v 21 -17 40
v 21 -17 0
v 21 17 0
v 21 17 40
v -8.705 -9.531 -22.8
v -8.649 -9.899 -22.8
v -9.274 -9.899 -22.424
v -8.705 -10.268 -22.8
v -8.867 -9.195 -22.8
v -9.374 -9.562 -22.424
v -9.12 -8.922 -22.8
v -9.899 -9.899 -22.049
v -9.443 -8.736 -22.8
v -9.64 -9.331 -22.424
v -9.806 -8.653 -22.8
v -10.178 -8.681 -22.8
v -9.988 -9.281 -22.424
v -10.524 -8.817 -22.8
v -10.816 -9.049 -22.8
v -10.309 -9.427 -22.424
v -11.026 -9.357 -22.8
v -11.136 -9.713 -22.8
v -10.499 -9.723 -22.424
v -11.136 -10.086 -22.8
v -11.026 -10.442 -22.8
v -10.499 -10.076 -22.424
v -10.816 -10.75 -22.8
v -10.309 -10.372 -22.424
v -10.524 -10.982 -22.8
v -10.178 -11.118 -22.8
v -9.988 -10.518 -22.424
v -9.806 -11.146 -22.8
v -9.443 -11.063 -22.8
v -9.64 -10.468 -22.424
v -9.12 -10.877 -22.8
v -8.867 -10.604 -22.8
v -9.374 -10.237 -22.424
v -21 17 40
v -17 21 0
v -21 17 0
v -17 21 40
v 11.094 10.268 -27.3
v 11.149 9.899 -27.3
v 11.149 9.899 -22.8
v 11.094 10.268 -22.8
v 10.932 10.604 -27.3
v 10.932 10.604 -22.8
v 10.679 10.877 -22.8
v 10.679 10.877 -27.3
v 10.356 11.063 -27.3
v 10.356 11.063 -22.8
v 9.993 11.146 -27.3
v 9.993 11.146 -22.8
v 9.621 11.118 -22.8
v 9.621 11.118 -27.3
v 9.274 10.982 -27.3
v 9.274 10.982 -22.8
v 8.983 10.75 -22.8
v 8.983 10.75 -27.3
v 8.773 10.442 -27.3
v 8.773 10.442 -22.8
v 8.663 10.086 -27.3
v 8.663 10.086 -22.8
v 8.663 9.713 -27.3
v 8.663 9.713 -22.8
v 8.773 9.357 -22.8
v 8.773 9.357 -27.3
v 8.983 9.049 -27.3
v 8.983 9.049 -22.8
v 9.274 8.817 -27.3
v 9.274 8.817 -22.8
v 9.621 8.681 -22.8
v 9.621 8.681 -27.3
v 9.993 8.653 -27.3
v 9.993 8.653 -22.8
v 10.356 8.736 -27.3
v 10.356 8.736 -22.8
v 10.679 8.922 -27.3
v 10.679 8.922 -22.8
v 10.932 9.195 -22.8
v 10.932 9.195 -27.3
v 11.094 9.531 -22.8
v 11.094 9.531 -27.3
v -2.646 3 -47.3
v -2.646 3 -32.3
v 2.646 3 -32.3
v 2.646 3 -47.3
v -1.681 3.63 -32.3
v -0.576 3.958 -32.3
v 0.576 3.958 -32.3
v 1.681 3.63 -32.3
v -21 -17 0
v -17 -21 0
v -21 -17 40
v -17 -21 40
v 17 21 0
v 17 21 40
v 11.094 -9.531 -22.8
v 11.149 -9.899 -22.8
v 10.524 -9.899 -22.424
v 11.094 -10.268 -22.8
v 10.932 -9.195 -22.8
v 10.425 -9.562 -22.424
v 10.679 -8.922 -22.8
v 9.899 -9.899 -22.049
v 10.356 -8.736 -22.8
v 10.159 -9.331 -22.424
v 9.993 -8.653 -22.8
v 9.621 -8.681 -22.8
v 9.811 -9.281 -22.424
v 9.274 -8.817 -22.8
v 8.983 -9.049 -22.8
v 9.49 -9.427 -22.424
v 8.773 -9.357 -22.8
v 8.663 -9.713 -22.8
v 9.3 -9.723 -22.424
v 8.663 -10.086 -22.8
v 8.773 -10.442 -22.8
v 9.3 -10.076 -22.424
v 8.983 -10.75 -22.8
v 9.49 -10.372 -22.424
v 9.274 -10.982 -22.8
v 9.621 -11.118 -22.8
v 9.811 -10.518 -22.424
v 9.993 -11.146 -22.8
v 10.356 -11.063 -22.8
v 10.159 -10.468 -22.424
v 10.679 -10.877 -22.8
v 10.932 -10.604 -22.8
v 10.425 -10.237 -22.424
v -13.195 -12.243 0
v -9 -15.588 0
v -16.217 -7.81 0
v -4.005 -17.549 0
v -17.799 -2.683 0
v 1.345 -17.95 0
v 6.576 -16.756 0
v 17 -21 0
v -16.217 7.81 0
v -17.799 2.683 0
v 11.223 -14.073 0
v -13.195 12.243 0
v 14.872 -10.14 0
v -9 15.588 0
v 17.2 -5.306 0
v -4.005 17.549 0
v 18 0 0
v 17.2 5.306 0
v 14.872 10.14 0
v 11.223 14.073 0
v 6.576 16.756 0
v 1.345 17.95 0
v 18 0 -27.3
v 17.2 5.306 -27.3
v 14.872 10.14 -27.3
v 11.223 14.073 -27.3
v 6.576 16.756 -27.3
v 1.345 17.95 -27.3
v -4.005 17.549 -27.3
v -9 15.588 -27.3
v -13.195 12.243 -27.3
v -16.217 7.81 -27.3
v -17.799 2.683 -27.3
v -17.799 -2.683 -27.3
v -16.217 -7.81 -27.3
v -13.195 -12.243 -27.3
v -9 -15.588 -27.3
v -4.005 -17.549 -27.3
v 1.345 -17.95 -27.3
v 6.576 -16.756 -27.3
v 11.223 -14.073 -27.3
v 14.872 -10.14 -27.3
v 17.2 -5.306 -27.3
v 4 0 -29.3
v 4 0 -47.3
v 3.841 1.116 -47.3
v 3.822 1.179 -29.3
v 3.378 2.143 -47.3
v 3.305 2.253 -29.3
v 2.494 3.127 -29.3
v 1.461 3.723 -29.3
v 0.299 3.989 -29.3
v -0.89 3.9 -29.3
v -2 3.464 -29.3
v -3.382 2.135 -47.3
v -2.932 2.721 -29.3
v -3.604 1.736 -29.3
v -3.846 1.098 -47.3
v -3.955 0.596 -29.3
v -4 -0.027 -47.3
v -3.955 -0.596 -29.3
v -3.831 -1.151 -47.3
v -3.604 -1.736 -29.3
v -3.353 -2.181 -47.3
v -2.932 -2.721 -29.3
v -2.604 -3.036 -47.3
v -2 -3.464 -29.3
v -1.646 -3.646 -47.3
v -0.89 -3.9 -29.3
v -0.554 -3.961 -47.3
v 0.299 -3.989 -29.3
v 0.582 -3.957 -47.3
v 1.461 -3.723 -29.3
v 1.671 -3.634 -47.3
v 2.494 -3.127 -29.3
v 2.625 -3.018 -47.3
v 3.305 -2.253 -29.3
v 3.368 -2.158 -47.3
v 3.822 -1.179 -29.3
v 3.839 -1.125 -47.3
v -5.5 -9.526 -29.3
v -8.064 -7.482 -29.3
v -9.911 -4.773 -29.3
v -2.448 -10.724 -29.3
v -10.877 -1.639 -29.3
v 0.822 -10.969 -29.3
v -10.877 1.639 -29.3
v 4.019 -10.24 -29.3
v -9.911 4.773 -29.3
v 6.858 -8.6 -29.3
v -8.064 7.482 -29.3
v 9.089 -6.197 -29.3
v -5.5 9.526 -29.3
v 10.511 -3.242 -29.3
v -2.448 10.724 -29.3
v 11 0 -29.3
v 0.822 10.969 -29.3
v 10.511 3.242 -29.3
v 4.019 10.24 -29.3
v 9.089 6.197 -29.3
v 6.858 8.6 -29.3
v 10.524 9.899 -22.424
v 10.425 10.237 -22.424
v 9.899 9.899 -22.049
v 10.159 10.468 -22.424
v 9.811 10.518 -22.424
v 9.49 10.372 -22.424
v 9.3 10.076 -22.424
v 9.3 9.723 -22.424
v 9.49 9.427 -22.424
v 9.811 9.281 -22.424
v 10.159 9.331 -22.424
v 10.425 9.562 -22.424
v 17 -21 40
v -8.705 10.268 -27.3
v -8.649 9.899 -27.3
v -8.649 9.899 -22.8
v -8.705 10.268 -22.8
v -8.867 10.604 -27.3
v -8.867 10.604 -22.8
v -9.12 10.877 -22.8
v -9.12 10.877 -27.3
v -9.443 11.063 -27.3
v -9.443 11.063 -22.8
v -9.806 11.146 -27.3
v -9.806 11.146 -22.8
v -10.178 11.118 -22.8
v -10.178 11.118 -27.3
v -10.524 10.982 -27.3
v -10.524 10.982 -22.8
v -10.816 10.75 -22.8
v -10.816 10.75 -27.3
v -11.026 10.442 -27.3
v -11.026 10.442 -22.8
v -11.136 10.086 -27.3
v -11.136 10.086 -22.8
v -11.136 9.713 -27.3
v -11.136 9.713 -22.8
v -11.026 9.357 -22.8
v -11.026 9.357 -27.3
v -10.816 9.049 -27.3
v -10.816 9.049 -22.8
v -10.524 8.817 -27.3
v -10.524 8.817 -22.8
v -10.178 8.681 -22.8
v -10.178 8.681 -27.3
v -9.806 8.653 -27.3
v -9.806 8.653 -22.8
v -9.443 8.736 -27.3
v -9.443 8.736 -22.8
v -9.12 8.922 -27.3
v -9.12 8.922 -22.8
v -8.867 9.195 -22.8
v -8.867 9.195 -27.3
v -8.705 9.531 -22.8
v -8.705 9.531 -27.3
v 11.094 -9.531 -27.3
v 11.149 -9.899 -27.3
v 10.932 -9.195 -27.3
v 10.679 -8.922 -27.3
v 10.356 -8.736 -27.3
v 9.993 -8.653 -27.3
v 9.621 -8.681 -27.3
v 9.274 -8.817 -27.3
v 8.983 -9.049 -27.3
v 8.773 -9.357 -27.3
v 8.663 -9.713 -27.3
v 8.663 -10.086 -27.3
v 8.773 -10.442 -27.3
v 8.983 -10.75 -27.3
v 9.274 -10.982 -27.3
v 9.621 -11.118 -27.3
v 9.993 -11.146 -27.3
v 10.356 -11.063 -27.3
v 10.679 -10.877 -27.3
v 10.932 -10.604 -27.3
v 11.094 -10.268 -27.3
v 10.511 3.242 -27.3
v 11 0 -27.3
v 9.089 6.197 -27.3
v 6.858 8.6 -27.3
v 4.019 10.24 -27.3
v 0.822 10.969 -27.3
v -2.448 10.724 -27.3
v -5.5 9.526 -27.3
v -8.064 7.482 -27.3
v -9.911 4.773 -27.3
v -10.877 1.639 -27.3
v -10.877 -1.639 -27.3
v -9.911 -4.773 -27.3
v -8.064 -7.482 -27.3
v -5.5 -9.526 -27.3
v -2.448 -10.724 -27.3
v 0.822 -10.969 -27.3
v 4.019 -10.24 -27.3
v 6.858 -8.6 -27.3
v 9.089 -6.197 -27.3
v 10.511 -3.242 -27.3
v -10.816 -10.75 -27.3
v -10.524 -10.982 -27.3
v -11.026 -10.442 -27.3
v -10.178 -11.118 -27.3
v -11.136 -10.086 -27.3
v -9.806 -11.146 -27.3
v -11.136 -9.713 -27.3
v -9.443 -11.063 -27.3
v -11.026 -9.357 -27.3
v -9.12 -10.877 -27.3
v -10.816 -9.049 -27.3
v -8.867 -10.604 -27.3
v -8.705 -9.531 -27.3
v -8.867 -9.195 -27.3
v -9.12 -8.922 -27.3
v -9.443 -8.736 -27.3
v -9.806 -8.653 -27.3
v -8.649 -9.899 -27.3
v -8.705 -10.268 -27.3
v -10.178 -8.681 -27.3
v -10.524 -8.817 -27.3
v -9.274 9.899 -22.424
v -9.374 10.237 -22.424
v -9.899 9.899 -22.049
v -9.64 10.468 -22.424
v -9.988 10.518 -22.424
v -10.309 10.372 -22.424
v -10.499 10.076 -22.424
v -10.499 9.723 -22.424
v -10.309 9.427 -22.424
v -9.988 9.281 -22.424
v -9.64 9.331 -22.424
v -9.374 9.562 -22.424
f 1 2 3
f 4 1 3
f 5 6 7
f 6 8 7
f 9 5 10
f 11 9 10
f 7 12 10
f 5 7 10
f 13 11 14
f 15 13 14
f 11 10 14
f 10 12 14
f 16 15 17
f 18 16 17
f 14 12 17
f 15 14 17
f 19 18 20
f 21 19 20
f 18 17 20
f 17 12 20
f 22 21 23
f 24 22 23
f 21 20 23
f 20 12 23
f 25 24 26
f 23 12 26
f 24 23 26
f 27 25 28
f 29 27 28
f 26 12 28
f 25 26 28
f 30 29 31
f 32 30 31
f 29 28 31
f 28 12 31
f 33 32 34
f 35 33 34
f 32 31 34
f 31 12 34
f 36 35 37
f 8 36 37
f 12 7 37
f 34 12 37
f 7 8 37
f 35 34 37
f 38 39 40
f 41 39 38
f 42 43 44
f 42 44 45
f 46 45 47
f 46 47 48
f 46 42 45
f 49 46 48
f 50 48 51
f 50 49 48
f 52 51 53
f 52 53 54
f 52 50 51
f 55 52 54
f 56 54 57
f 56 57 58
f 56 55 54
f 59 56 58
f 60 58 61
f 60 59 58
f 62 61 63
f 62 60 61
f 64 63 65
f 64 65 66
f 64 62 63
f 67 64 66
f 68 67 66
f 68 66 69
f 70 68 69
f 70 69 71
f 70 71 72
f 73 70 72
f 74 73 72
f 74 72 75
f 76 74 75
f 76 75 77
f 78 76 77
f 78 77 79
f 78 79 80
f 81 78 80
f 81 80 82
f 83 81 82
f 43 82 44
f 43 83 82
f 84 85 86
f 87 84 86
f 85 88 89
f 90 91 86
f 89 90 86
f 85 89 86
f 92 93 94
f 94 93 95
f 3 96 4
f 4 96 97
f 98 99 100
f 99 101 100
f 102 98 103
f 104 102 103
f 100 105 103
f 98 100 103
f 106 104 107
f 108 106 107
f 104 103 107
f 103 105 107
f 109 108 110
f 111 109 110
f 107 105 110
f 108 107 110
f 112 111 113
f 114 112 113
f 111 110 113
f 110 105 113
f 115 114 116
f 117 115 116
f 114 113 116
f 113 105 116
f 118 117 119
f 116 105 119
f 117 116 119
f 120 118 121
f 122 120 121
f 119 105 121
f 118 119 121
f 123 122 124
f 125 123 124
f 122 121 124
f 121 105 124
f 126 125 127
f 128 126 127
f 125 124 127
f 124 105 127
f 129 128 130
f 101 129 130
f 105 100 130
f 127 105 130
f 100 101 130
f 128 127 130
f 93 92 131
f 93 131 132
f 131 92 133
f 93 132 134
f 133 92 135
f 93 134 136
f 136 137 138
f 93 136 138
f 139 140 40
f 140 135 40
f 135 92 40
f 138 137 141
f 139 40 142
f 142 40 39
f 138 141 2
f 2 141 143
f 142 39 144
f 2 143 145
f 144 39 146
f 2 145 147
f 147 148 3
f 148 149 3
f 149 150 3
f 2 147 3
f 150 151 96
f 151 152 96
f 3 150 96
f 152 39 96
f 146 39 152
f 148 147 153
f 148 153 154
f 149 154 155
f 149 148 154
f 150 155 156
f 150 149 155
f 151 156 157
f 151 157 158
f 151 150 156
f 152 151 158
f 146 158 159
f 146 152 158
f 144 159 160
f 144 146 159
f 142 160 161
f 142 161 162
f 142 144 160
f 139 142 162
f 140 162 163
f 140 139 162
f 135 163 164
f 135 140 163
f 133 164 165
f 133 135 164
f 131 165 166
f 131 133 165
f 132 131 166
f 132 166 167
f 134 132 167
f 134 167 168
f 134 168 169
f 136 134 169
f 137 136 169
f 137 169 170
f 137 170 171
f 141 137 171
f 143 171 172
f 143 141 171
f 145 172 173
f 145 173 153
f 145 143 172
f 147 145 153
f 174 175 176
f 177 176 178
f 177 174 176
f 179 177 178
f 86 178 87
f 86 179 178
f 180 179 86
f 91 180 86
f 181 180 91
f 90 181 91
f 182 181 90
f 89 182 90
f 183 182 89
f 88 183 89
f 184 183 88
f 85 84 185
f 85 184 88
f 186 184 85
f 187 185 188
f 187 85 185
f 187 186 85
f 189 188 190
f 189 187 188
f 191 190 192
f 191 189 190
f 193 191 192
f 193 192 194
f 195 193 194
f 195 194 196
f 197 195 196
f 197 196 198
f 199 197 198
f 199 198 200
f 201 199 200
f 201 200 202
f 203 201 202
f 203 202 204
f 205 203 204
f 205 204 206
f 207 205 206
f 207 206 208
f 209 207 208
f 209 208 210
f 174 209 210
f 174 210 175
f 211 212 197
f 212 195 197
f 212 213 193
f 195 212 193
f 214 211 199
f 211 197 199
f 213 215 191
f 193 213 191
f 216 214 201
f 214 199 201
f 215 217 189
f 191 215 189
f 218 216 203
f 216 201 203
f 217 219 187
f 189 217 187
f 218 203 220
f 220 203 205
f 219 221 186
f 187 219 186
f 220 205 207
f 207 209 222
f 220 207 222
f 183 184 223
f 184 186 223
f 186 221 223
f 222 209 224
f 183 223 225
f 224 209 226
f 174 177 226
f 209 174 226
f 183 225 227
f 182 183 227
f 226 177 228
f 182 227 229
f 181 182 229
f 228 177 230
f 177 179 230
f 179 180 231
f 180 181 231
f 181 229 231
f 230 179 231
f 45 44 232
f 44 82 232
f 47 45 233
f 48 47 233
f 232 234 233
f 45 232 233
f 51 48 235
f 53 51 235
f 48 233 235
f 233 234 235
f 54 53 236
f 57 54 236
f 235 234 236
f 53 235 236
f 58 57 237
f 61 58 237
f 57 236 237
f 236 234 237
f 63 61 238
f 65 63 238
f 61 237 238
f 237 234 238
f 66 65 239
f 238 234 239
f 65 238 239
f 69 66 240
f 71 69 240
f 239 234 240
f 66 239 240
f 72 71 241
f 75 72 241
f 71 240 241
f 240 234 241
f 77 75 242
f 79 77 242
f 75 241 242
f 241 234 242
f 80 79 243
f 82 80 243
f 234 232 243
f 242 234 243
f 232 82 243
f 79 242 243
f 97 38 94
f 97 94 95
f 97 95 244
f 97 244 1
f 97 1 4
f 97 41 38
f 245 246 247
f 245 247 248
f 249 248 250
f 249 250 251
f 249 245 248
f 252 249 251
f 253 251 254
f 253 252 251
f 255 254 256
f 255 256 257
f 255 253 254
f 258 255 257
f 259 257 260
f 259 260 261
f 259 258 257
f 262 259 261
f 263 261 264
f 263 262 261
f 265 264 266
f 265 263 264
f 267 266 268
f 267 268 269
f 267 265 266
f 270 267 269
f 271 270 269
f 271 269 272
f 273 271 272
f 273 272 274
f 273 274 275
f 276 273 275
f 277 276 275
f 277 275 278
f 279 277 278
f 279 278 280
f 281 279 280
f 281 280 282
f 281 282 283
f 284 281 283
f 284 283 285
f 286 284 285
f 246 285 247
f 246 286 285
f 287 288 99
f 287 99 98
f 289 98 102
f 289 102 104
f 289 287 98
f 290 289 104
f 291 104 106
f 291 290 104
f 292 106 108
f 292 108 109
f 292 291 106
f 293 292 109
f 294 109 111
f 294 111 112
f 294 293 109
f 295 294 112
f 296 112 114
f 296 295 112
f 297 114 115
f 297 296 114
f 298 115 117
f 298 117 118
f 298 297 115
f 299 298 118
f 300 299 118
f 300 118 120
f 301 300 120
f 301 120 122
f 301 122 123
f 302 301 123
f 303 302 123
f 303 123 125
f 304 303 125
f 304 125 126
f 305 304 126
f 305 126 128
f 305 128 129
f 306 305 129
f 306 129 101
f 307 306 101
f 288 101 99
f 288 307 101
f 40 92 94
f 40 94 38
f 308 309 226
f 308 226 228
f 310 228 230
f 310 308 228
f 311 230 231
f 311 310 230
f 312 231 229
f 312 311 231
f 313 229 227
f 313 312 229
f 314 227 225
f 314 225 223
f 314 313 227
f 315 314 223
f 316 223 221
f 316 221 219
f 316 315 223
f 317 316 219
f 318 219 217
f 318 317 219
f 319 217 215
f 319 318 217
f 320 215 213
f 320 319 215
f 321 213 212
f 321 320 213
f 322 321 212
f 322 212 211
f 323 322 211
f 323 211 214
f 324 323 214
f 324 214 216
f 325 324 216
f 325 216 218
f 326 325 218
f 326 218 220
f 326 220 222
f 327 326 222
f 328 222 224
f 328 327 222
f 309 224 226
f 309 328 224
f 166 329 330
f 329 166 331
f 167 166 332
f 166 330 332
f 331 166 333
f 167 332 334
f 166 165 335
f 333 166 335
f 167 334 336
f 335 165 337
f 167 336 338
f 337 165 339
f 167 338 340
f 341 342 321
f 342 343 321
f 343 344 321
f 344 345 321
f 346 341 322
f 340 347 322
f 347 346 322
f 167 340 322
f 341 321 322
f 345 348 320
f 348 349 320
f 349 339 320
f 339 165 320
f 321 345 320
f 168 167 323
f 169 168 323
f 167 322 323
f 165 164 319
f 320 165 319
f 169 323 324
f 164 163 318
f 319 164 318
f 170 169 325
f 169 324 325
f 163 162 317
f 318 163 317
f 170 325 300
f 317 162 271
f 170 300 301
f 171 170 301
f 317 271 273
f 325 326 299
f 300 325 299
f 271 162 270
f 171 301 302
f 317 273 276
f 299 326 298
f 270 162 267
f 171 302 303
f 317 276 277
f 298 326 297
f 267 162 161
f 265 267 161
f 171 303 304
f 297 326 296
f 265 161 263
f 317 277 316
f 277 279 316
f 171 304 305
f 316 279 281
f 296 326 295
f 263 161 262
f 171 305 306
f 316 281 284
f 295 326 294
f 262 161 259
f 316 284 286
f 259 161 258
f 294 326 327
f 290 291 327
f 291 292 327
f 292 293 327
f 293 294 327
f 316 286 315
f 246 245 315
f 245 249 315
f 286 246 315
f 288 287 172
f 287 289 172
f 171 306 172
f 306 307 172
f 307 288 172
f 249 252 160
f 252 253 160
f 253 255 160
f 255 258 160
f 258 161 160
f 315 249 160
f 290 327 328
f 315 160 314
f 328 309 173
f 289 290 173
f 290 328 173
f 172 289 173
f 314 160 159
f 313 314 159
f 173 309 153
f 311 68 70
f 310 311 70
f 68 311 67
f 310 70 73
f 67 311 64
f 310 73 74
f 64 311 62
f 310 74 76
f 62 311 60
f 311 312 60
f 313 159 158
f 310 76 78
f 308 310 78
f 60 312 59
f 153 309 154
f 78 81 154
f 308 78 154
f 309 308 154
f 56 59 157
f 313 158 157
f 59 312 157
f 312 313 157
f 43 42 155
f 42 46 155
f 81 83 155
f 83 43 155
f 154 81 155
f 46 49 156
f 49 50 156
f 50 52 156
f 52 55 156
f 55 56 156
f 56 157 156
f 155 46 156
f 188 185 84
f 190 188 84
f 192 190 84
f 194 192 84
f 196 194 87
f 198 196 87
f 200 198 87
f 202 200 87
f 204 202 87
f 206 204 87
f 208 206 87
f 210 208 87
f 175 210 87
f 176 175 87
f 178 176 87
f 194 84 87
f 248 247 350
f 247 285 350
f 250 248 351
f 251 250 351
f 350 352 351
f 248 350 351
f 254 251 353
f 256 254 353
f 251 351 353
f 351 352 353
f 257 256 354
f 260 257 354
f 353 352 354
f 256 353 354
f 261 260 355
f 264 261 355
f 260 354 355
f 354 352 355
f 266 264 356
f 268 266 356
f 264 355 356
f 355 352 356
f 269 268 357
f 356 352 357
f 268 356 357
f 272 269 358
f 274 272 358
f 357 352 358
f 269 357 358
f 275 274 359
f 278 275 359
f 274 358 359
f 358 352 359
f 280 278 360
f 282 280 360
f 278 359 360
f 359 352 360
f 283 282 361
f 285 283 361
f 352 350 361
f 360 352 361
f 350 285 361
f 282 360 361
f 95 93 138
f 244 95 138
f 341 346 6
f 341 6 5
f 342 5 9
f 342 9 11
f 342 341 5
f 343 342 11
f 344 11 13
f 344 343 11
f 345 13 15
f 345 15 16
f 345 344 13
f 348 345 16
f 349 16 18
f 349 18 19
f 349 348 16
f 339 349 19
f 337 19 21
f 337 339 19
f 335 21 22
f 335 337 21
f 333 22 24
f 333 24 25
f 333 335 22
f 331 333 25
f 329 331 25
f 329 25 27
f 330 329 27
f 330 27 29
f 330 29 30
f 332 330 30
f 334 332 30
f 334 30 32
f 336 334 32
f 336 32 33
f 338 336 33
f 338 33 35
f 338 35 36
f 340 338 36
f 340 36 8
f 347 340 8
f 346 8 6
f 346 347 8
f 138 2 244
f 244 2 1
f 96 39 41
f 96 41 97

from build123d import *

# Parameters (mm, degrees)
SKETCH_W     = 42
SKETCH_H     = 42
PAD_DEPTH    = 40
CHAMFER_SIZE = 4
SKETCH005_R  = 18
PAD003_DEPTH = 27.3
SKETCH001_R  = 11
PAD001_DEPTH = 2
SKETCH002_R  = 4
PAD002_DEPTH = 20
POCKET_DEPTH = 15
SKETCH004_R  = 1.25
HOLE_DEPTH   = 4.5
HOLE_TIPS_R  = 1.25


with BuildPart() as part:
    # Sketch → Pad (new body)
    with BuildSketch(Plane.XY):
        Rectangle(SKETCH_W, SKETCH_H)
    extrude(amount=PAD_DEPTH)

    # Chamfer
    chamfer_edges = [part.edges().sort_by_distance(p)[0] for p in [
        (21, -21, 20),
        (-21, -21, 20),
        (21, 21, 20),
        (-21, 21, 20),
    ]]
    chamfer(chamfer_edges, length=CHAMFER_SIZE)

    # Sketch005 → Pad003 (join)
    with BuildSketch(Plane.XY):
        Circle(SKETCH005_R)
    extrude(amount=-PAD003_DEPTH)

    # Sketch001 → Pad001 (join)
    with BuildSketch(Plane.XY.offset(-27.3)):
        Circle(SKETCH001_R)
    extrude(amount=-PAD001_DEPTH)

    # Sketch002 (on Sketch) → Pad002 (join)
    with BuildSketch(Plane.XY.offset(-27.3)):
        Circle(SKETCH002_R)
    extrude(amount=-PAD002_DEPTH)

    # Sketch003 (on Sketch) → Pocket (cut)
    with BuildSketch(Plane.XY.offset(-32.3)):
        with BuildLine():
            ThreePointArc((10.583005, 3), (0, 11), (-10.583005, 3))
            Line((-10.583005, 3), (10.583005, 3))
        make_face()
    extrude(amount=-POCKET_DEPTH, mode=Mode.SUBTRACT)

    # Sketch004 (on Sketch) → Hole (cut)
    with BuildSketch(Plane.XY.offset(-27.3)):
        with Locations((9.899495, 9.899495)):
            Circle(SKETCH004_R)
        with Locations((-9.899495, 9.899495)):
            Circle(SKETCH004_R)
        with Locations((-9.899495, -9.899495)):
            Circle(SKETCH004_R)
        with Locations((9.899495, -9.899495)):
            Circle(SKETCH004_R)
    extrude(amount=HOLE_DEPTH, mode=Mode.SUBTRACT)

    # Hole tips → Hole tip 1 section 0
    with BuildSketch(Plane.XY.offset(-22.8), mode=Mode.PRIVATE) as hole_tip_1_s0:
        with Locations((9.899495, 9.899495)):
            Circle(HOLE_TIPS_R)
    loft([hole_tip_1_s0.sketch, Vertex(9.899495, 9.899495, -22.048924)], mode=Mode.SUBTRACT)

    # Hole tips → Hole tip 2 section 0
    with BuildSketch(Plane.XY.offset(-22.8), mode=Mode.PRIVATE) as hole_tip_2_s0:
        with Locations((-9.899495, 9.899495)):
            Circle(HOLE_TIPS_R)
    loft([hole_tip_2_s0.sketch, Vertex(-9.899495, 9.899495, -22.048924)], mode=Mode.SUBTRACT)

    # Hole tips → Hole tip 3 section 0
    with BuildSketch(Plane.XY.offset(-22.8), mode=Mode.PRIVATE) as hole_tip_3_s0:
        with Locations((-9.899495, -9.899495)):
            Circle(HOLE_TIPS_R)
    loft([hole_tip_3_s0.sketch, Vertex(-9.899495, -9.899495, -22.048924)], mode=Mode.SUBTRACT)

    # Hole tips → Hole tip 4 section 0
    with BuildSketch(Plane.XY.offset(-22.8), mode=Mode.PRIVATE) as hole_tip_4_s0:
        with Locations((9.899495, -9.899495)):
            Circle(HOLE_TIPS_R)
    loft([hole_tip_4_s0.sketch, Vertex(9.899495, -9.899495, -22.048924)], mode=Mode.SUBTRACT)


solid = part.part
